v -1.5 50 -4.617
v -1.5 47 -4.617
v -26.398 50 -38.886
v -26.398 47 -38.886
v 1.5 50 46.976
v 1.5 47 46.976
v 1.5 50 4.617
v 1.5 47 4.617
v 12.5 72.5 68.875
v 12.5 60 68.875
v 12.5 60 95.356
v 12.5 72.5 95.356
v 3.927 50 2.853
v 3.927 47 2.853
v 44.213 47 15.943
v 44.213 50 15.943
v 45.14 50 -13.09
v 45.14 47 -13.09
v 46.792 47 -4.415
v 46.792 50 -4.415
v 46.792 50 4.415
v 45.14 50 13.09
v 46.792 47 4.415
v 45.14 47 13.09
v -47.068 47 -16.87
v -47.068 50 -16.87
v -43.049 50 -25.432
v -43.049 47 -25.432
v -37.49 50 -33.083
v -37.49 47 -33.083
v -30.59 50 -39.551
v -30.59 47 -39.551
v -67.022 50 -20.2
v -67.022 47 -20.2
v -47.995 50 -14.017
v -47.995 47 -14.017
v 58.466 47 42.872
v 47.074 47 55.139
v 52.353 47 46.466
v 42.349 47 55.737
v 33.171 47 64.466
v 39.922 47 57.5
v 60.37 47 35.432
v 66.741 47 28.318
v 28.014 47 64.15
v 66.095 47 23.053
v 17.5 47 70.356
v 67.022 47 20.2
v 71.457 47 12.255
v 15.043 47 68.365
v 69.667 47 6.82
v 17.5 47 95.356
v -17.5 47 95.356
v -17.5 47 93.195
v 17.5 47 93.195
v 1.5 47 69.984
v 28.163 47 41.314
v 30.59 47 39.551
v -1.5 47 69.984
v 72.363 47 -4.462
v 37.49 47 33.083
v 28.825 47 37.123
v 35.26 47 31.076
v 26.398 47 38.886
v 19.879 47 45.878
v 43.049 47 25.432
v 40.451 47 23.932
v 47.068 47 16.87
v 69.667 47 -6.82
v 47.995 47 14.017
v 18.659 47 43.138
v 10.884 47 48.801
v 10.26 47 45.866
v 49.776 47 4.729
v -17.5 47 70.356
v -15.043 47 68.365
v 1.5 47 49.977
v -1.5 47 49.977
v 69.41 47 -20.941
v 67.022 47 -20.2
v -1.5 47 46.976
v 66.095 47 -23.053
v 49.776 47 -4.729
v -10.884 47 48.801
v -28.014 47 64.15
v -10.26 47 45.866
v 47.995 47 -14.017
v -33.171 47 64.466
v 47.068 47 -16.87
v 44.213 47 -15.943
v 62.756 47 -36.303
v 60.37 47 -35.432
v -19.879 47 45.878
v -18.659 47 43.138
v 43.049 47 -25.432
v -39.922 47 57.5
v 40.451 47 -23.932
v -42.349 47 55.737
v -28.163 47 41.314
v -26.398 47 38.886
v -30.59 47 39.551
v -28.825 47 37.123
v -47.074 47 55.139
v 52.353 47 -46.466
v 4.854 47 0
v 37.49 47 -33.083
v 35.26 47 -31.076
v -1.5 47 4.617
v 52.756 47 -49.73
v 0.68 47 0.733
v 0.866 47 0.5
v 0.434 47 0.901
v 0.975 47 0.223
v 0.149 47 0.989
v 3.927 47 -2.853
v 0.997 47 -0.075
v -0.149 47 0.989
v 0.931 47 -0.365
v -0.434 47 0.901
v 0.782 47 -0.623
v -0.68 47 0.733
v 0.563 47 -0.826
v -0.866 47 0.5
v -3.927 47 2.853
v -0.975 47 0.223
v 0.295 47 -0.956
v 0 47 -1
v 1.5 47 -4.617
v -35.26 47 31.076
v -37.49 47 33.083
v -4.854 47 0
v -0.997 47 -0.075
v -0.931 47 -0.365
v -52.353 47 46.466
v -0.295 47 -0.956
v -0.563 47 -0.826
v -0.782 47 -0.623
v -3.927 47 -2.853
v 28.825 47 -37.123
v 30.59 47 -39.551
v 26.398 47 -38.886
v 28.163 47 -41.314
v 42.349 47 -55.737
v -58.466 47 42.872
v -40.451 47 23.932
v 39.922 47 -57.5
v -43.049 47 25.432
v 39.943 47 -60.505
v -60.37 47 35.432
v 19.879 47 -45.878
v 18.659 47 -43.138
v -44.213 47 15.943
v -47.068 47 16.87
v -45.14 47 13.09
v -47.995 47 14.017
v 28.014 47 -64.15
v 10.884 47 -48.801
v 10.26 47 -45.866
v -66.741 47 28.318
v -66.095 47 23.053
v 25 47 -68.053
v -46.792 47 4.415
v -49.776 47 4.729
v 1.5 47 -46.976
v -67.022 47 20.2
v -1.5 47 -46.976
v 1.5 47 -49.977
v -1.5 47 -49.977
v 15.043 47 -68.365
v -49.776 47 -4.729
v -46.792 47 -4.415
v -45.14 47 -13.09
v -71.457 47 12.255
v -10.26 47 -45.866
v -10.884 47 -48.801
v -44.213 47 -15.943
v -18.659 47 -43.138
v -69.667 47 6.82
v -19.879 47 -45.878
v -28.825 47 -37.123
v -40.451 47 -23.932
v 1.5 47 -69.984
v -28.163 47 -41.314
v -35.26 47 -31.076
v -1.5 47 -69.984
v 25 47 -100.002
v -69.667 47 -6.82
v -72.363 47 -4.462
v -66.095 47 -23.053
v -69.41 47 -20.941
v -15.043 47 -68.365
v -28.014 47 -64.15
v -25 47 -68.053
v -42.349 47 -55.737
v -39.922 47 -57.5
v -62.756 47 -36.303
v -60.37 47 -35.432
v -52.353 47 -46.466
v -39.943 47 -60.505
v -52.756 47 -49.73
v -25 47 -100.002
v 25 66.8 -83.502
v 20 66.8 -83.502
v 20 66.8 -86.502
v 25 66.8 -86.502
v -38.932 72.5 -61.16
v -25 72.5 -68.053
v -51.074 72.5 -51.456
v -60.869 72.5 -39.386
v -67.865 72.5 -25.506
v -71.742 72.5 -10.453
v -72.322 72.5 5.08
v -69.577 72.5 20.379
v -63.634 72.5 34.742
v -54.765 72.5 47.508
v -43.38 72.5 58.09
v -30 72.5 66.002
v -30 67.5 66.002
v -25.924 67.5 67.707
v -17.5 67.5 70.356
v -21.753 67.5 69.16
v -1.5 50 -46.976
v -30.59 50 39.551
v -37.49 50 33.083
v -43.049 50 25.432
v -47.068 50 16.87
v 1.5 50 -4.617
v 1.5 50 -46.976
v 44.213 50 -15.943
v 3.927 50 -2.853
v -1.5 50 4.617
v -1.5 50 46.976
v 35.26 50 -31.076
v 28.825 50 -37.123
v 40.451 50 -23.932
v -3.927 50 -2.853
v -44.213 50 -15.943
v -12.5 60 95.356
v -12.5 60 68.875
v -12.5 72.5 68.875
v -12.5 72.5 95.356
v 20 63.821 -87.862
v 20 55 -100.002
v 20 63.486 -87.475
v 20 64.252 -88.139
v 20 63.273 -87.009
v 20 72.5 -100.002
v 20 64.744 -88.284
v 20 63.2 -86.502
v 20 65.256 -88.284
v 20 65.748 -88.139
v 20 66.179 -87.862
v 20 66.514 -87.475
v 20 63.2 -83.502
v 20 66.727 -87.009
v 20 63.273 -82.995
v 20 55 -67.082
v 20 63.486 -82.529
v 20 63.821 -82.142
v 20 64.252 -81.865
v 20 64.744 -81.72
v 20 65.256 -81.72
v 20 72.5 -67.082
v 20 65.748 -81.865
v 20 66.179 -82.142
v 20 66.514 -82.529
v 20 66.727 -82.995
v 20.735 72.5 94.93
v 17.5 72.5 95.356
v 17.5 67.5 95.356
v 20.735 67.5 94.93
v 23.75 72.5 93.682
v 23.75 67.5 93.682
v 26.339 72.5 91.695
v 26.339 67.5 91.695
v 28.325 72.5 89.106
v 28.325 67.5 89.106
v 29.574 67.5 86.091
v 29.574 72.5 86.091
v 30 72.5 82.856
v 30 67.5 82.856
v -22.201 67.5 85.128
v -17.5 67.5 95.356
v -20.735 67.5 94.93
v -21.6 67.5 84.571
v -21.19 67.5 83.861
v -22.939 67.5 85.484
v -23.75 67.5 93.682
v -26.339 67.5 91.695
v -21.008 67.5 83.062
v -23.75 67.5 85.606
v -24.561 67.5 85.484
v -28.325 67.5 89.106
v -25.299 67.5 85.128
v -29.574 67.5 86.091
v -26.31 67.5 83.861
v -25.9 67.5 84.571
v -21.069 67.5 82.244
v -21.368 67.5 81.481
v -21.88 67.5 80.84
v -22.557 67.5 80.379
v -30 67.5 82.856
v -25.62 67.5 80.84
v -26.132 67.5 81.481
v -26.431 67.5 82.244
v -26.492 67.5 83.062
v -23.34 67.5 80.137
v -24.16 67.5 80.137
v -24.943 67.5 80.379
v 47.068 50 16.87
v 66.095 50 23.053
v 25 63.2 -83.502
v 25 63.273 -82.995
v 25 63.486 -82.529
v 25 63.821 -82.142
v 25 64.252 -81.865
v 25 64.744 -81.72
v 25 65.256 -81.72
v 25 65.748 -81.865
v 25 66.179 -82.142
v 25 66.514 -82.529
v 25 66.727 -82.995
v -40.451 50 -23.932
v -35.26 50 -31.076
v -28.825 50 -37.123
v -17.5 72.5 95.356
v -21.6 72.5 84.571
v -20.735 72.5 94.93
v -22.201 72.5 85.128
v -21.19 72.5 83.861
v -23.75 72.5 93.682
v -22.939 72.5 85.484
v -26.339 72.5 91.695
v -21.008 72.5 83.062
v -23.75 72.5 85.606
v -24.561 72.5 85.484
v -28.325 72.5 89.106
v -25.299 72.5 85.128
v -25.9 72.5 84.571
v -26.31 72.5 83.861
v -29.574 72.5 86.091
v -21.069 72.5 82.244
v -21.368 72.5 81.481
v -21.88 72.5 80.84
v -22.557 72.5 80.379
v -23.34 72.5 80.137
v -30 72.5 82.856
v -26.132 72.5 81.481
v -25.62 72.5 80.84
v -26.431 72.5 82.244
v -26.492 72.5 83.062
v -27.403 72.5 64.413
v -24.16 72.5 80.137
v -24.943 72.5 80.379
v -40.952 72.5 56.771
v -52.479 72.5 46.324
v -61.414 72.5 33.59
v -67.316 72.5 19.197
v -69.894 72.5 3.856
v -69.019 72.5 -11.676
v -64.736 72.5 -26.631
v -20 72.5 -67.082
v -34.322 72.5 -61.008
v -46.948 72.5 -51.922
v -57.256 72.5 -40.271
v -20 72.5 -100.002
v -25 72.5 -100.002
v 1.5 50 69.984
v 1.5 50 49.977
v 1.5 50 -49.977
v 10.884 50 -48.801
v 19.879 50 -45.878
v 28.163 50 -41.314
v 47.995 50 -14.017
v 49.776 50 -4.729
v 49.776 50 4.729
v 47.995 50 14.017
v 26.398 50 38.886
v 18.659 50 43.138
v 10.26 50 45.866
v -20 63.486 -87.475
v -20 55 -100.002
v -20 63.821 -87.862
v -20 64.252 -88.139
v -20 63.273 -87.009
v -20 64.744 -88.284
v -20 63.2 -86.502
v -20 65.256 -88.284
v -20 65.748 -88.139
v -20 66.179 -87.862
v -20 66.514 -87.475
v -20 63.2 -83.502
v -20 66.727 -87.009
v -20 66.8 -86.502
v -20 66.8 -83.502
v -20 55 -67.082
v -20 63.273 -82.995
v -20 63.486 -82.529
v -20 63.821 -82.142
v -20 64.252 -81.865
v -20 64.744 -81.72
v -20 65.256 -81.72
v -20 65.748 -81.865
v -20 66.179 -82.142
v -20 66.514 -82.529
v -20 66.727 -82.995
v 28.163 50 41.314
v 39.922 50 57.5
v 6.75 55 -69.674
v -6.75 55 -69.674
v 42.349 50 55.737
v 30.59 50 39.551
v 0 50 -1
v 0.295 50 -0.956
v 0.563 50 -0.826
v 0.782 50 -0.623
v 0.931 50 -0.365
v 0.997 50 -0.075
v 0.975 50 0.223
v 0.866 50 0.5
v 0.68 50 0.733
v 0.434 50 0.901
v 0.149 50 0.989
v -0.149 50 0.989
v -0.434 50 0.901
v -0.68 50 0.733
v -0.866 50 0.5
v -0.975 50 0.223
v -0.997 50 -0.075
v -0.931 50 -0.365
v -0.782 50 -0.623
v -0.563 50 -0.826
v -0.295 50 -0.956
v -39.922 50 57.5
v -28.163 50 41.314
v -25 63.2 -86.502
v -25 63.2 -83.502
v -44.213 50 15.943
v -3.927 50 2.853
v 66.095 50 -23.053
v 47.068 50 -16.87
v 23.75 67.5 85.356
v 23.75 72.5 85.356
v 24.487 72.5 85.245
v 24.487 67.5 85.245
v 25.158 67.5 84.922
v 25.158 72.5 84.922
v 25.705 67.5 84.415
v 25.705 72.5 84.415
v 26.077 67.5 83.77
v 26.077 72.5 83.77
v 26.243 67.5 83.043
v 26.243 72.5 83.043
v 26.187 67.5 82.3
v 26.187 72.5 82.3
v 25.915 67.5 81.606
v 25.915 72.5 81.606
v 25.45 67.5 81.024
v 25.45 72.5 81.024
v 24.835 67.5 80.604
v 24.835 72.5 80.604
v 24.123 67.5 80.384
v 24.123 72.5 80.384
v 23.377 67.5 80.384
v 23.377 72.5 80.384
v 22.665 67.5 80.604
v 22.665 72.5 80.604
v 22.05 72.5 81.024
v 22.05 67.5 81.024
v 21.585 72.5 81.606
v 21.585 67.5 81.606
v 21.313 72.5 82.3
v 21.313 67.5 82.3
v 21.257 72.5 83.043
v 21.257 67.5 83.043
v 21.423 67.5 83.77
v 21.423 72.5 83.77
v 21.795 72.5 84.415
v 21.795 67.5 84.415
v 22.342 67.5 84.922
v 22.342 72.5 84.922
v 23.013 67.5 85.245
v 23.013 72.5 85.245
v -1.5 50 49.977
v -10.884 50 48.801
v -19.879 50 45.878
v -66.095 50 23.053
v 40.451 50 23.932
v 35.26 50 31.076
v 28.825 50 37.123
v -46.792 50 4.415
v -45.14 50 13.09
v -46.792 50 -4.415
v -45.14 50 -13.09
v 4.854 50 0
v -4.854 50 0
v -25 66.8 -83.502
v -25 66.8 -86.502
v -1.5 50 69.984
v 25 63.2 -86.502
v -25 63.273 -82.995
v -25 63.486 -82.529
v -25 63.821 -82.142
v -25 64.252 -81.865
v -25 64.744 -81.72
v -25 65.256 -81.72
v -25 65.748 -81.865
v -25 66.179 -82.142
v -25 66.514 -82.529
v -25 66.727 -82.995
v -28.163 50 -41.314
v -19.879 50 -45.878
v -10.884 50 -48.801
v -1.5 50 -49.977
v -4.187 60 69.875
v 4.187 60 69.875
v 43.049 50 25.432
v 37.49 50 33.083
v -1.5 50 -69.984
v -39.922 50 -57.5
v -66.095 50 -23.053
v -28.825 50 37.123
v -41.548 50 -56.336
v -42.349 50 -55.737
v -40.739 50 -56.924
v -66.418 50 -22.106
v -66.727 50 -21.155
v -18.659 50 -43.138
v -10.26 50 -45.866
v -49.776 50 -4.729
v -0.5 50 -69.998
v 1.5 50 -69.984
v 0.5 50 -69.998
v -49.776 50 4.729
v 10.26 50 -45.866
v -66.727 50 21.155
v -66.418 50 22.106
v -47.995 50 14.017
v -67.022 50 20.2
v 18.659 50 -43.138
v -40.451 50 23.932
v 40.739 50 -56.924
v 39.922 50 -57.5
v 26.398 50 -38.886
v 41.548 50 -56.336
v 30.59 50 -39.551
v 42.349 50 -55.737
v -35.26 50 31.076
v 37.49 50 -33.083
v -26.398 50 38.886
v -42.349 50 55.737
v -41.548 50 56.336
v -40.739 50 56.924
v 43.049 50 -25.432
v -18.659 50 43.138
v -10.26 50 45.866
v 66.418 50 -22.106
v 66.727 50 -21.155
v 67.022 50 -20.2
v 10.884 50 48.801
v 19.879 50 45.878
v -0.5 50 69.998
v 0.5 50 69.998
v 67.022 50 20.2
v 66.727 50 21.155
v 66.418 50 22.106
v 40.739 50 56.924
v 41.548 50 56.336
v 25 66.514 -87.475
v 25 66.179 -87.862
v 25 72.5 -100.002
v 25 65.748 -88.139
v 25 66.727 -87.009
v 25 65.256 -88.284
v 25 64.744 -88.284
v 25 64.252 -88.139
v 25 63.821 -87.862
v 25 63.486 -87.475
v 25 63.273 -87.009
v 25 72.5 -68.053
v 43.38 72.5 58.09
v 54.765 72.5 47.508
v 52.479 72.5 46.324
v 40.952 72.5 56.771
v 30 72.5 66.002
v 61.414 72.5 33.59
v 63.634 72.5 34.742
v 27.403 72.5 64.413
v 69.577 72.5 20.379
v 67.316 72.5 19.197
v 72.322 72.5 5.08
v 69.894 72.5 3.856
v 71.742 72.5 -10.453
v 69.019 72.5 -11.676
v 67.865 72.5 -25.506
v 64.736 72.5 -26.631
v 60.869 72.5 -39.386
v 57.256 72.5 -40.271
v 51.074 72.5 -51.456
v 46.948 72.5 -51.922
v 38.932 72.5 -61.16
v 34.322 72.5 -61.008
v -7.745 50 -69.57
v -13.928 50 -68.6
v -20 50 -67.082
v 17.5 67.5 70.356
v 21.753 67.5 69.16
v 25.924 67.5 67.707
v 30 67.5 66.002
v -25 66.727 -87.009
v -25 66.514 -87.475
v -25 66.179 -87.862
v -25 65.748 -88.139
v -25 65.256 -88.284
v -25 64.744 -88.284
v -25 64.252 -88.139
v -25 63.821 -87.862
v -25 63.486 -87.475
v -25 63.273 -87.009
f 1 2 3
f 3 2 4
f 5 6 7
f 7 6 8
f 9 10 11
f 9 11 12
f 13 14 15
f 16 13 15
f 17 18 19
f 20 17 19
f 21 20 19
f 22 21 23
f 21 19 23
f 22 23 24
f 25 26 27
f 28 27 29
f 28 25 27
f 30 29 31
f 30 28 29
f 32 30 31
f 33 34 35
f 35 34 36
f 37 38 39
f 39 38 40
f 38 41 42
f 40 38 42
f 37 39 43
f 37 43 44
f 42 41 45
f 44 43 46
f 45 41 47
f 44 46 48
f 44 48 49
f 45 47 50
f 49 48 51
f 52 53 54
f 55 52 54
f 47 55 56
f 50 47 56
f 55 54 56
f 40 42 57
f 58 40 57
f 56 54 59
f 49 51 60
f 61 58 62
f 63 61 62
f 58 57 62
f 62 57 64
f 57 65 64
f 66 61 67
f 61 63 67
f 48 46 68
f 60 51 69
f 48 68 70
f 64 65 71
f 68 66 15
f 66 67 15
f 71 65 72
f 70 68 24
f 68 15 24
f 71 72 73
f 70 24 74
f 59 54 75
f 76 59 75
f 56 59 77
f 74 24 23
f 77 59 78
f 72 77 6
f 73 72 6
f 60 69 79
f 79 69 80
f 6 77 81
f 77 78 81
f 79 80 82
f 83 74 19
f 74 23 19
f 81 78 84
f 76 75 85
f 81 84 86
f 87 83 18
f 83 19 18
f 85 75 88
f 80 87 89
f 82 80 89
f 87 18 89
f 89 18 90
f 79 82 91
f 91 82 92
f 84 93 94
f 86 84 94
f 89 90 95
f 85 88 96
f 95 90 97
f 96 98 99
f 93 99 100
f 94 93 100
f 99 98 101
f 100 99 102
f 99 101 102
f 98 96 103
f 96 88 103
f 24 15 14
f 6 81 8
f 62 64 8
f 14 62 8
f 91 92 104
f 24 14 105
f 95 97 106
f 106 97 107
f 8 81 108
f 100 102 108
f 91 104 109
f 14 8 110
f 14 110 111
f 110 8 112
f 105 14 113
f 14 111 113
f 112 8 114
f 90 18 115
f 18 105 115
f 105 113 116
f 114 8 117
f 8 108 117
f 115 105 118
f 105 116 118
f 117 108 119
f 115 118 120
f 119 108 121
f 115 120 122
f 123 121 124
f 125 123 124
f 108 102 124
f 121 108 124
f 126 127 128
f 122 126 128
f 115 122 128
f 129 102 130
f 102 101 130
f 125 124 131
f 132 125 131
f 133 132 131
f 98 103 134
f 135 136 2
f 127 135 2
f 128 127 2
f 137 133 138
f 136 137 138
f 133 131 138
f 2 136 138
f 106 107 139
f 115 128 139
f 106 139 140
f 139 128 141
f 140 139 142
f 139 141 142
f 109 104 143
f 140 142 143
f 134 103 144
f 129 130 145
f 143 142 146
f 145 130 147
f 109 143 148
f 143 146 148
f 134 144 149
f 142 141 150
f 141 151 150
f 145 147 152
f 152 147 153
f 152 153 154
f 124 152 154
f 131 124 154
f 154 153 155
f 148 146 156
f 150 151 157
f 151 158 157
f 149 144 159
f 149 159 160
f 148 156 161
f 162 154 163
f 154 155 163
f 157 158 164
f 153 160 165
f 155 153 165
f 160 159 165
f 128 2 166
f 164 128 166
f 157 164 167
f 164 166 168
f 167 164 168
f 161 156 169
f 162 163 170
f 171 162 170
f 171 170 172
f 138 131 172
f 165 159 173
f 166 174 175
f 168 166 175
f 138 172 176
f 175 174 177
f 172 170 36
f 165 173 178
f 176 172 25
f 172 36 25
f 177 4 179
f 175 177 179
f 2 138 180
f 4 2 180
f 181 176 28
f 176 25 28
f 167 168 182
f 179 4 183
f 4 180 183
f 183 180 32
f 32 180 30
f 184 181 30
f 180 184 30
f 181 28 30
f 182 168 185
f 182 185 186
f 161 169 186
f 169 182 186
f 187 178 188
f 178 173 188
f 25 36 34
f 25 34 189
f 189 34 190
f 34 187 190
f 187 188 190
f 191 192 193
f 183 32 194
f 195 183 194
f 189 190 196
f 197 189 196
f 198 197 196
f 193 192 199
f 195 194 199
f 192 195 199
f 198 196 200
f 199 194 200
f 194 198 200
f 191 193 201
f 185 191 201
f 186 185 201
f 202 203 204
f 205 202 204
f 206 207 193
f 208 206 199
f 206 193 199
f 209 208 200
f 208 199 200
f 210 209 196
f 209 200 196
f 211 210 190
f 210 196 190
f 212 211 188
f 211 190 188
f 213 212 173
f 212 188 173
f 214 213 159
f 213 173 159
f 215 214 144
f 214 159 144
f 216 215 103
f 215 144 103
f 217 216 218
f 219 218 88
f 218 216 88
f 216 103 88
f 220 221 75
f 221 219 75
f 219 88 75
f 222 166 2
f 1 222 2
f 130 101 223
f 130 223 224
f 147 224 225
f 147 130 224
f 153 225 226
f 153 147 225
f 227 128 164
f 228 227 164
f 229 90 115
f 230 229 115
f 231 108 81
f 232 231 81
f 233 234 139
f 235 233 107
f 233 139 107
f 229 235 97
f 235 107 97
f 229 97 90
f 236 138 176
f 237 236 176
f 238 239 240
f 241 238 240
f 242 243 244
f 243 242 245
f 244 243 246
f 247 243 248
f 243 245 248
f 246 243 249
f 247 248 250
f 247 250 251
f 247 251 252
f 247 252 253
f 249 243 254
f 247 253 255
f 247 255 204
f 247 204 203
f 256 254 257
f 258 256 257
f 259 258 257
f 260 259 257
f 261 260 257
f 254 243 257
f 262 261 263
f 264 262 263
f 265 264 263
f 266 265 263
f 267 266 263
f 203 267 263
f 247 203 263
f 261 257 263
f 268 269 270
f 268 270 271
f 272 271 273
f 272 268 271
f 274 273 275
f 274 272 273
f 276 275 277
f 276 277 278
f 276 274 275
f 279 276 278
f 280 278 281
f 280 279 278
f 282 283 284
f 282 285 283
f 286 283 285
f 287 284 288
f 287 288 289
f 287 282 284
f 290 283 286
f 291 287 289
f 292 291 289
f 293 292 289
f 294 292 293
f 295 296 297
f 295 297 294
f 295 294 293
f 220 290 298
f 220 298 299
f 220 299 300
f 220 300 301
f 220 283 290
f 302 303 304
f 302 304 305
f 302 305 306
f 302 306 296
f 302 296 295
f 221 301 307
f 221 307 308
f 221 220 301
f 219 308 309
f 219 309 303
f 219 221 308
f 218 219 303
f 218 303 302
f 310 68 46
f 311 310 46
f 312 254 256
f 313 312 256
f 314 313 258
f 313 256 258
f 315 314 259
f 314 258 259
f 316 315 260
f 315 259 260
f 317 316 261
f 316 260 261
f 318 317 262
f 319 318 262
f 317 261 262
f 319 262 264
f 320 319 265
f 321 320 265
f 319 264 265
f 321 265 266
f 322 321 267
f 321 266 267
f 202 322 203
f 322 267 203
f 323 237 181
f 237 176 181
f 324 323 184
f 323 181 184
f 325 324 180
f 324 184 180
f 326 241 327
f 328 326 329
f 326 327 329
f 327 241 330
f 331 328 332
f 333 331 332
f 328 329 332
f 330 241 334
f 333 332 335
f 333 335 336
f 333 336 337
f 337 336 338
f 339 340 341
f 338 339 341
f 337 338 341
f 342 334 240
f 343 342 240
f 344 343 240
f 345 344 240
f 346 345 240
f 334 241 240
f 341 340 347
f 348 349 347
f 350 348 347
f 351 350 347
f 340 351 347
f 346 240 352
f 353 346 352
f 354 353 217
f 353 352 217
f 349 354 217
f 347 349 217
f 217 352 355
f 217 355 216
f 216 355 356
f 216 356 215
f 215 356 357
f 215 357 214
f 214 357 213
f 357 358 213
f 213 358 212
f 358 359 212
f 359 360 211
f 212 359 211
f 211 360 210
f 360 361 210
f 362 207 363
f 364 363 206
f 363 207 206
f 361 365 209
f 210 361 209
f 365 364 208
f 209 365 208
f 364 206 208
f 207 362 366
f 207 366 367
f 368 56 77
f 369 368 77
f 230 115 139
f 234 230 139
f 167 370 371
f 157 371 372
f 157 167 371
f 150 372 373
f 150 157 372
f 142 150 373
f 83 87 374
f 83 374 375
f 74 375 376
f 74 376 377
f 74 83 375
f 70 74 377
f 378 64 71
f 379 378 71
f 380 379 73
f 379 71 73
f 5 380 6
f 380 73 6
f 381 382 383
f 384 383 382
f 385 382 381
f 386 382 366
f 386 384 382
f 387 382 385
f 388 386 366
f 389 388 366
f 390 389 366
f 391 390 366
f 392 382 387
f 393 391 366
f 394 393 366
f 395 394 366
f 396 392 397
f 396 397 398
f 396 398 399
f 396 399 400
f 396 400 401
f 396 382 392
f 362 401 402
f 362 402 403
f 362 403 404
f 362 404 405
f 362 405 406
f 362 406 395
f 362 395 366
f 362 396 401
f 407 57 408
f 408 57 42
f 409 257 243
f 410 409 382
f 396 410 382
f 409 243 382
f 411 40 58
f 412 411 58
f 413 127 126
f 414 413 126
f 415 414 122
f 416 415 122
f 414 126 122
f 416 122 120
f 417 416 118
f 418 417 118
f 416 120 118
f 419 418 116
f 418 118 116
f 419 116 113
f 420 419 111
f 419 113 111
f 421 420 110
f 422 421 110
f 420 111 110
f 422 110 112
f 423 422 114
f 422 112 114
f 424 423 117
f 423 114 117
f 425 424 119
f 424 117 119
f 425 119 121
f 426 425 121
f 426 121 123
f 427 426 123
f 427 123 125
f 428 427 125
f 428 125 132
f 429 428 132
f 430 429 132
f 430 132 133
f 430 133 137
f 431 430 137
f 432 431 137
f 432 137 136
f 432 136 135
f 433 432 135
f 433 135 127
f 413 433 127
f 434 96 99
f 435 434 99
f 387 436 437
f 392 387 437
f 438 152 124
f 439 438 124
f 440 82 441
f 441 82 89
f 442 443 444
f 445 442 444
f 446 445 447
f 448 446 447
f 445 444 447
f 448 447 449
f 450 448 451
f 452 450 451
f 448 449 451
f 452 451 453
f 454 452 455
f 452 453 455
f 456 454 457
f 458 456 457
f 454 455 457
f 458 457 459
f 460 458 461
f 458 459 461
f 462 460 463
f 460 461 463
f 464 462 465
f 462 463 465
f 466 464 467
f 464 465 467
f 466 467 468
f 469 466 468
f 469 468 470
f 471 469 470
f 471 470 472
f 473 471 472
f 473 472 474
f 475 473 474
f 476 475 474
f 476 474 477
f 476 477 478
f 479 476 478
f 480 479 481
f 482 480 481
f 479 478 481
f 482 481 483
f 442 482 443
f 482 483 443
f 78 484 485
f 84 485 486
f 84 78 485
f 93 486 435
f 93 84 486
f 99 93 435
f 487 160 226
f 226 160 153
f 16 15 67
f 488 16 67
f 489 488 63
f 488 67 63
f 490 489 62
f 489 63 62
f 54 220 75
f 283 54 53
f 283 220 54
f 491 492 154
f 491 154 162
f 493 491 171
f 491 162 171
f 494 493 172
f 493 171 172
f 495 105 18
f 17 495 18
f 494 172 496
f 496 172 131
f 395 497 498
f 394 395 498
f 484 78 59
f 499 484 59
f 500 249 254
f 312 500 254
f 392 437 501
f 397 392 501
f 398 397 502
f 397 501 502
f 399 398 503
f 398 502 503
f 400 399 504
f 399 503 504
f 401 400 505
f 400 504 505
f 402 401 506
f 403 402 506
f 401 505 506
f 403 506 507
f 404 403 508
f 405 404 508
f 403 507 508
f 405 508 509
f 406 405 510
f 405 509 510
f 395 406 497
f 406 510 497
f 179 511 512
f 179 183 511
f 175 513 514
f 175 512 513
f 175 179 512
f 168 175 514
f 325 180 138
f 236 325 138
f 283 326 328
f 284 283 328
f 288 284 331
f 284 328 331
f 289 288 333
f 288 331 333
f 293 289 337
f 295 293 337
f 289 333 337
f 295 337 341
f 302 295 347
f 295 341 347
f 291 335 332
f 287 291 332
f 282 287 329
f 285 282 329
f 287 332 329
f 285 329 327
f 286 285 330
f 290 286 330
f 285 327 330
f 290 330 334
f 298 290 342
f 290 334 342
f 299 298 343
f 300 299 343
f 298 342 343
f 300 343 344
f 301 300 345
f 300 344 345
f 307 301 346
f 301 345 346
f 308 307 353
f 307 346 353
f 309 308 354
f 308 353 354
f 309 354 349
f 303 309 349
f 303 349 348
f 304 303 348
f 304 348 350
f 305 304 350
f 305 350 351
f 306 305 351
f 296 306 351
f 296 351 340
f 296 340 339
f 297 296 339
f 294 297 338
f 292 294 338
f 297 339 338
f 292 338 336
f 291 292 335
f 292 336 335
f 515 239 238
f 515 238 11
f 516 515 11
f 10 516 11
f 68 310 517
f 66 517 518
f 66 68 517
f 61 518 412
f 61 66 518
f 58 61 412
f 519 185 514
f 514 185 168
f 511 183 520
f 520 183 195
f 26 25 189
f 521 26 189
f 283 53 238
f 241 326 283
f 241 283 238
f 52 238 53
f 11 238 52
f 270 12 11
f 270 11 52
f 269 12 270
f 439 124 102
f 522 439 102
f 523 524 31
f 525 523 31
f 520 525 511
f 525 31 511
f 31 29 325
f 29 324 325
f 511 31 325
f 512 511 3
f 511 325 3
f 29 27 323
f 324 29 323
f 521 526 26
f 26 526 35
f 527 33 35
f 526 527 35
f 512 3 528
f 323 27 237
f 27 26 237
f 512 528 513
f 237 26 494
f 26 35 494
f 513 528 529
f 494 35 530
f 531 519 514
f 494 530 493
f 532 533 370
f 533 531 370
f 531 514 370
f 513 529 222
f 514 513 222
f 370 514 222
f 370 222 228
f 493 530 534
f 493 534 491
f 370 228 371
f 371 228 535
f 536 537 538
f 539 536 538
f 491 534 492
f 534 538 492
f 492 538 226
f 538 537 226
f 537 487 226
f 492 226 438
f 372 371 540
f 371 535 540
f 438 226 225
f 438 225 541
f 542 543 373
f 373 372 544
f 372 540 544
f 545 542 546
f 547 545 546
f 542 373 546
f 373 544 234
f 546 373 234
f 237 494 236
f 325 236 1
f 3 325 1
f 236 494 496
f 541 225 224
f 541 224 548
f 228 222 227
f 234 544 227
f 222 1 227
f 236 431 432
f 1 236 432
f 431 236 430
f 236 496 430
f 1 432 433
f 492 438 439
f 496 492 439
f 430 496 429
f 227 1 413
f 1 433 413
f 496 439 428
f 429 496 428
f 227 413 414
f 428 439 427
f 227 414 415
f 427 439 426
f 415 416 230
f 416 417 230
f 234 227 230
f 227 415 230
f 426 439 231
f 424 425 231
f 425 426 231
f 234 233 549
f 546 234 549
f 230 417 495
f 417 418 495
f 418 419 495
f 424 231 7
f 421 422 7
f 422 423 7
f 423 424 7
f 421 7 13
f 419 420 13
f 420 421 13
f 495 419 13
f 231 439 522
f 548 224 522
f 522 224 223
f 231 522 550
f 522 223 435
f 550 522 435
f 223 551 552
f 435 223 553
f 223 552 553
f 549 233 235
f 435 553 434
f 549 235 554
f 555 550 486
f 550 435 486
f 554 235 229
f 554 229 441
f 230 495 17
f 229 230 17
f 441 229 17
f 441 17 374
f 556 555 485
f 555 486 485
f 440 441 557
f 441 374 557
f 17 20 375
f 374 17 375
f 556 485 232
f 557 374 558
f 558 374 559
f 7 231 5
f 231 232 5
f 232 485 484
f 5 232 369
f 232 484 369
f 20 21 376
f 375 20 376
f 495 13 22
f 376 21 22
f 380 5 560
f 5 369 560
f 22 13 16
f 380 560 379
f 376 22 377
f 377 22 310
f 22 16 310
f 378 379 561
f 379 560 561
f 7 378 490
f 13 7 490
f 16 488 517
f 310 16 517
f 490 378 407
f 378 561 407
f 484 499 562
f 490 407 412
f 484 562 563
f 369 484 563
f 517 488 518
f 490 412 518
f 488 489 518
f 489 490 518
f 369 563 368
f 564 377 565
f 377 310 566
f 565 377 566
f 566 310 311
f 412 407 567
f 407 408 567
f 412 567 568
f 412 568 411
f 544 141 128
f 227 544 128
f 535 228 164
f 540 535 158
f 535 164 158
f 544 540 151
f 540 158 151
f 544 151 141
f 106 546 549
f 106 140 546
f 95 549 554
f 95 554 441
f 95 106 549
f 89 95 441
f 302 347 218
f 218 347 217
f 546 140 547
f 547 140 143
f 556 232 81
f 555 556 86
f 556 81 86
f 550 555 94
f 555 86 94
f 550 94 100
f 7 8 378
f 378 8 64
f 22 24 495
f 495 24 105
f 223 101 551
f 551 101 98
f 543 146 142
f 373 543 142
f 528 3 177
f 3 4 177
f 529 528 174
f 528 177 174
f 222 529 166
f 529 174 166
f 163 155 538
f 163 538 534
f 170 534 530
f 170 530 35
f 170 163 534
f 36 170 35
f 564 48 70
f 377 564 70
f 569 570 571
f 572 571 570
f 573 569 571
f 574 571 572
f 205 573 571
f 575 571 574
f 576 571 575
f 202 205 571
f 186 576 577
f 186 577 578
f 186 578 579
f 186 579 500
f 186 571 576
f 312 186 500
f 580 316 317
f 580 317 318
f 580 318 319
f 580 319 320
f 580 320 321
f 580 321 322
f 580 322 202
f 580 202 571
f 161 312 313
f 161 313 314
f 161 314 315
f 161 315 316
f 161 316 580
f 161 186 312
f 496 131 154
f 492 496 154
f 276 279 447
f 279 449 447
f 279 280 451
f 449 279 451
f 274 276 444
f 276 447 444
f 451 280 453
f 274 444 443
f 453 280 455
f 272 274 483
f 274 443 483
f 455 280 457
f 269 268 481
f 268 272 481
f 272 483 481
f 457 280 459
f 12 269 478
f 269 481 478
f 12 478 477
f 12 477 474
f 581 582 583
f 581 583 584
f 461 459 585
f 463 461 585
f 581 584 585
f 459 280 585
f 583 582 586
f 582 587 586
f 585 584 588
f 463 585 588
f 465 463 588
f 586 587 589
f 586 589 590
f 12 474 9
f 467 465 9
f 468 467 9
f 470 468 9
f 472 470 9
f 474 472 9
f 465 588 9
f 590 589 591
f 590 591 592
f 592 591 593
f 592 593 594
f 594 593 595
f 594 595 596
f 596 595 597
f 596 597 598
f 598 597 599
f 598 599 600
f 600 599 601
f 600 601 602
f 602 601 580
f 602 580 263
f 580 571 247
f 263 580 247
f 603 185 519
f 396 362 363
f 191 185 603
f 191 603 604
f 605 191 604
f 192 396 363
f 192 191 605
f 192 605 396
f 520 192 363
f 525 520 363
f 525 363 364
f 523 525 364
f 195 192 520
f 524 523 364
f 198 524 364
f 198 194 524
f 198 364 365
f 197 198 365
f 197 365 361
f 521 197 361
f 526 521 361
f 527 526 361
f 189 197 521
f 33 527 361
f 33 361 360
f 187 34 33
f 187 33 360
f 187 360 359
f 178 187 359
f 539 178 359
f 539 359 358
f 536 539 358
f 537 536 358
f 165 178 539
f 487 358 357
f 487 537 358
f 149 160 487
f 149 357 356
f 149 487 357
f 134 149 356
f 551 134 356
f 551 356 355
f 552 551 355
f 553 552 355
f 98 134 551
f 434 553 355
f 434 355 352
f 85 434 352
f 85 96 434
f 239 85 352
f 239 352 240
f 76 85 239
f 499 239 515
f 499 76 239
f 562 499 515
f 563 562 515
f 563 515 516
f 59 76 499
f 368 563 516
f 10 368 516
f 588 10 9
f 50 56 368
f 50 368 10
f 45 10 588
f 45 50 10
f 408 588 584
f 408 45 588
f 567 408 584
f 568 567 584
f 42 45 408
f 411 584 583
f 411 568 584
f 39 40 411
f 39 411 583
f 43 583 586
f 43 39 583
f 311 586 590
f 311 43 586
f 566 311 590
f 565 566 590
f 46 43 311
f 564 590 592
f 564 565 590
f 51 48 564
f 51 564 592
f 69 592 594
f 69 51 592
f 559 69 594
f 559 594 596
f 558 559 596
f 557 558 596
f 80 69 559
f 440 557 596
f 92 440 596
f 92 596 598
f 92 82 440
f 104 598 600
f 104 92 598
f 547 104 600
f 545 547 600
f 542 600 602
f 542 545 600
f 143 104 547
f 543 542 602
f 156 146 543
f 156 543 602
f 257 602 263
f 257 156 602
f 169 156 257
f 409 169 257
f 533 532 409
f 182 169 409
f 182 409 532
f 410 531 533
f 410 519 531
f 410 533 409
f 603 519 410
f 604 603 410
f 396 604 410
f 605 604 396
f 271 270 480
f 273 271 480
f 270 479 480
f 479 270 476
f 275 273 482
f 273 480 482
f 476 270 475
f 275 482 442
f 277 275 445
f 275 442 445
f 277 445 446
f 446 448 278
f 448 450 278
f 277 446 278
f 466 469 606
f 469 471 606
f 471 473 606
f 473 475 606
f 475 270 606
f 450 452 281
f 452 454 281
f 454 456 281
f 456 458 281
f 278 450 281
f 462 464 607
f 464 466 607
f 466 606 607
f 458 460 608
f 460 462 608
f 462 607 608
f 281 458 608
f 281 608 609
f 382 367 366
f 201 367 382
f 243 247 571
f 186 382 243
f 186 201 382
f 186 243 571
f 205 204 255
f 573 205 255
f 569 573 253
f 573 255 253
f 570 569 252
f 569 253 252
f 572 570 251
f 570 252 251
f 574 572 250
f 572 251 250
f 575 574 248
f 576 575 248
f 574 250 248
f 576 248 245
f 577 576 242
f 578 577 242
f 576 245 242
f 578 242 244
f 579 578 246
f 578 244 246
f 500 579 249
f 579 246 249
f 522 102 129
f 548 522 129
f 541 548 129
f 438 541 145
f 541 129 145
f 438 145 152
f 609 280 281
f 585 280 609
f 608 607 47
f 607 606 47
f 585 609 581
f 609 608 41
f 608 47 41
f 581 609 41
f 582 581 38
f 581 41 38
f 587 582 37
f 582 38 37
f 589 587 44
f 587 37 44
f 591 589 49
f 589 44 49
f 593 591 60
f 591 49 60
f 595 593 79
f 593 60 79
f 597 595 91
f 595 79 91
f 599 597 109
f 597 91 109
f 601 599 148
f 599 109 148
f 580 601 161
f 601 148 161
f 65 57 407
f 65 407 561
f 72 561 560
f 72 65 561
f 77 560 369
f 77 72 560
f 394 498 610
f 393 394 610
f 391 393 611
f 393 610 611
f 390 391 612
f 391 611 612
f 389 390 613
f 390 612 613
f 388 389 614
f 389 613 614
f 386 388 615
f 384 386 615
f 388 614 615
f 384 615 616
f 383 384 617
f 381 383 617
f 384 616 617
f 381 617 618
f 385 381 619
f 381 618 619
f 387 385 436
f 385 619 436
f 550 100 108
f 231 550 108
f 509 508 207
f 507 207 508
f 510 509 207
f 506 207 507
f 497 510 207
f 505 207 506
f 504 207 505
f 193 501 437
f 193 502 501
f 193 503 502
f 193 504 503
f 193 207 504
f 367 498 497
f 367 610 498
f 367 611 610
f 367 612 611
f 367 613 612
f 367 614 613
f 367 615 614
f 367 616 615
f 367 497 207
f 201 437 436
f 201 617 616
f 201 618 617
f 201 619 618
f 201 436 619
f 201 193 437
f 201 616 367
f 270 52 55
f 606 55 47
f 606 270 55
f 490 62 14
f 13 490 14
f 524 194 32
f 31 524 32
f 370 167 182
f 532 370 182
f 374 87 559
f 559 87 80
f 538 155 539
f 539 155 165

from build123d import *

# Parameters (mm, degrees)
SKETCH1_R               = 72.5
SKETCH1_R_2             = 70
BOSS_EXTRUDE4_DEPTH     = 16
BOSS_EXTRUDE5_DEPTH     = 50
SKETCH2_R               = 1
CUT_EXTRUDE1_DEPTH      = 115.072345465
SKETCH3_R               = 50
SKETCH3_R_2             = 47
BOSS_EXTRUDE6_DEPTH     = 50
SKETCH1_12_R            = 72.5
SKETCH1_12_R_2          = 70
BOSS_EXTRUDE7_DEPTH     = 72.5
BOSS_EXTRUDE8_DEPTH     = 26
SKETCH5_W               = 25
SKETCH5_H               = 25
CUT_EXTRUDE4_DEPTH      = 137.5
SKETCH7_R               = 2.75
SKETCH7_R_2             = 2.5
BOSS_EXTRUDE9_DEPTH     = 5
SKETCH12_W              = 40
SKETCH12_H              = 45
CUT_EXTRUDE5_DEPTH      = 180
BOSS_EXTRUDE11_START    = -49.596857296
BOSS_EXTRUDE11_DEPTH    = 49.596857296
SKETCH12_2_W            = 40
SKETCH12_2_H            = 45
CUT_EXTRUDE6_DEPTH      = 199.5
CUT_EXTRUDE7_DEPTH      = 136.410776564
CUT_EXTRUDE7_DEPTH_BACK = 136.410776564
SKETCH17_W              = 54.58952291
SKETCH17_H              = 5.845779458
CUT_EXTRUDE8_DEPTH      = 158.362345779
CUT_EXTRUDE8_DEPTH_BACK = 158.362345779
SKETCH22_W              = 10
SKETCH22_H              = 10
BOSS_EXTRUDE12_DEPTH    = 22.903142704
CUT_EXTRUDE9_DEPTH      = 144.988394911
CUT_EXTRUDE9_DEPTH_BACK = 144.988394911
SKETCH24_W              = 215.86755616
SKETCH24_H              = 61.868005926
BOSS_EXTRUDE13_DEPTH    = 5
SKETCH27_W              = 40.372489194
SKETCH27_H              = 5.878977483
CUT_EXTRUDE11_DEPTH     = 5


with BuildPart() as part:
    # Sketch1 → Boss-Extrude4 (new body)
    with BuildSketch(Plane(origin=(0, 0, 0), x_dir=(1, 0, 0), z_dir=(0, 1, 0))):
        with Locations(Location((0, 0, 0), (0, 0, 270))):
            Circle(SKETCH1_R)
        with Locations(Location((0, 0, 0), (0, 0, 270))):
            Circle(SKETCH1_R_2, mode=Mode.SUBTRACT)
    extrude(amount=BOSS_EXTRUDE4_DEPTH)

    # Sketch1<11> → Boss-Extrude5 (add)
    with BuildSketch(Plane(origin=(0, 0, 0), x_dir=(1, 0, 0), z_dir=(0, 1, 0))):
        Polygon((1.5, 69.983926726), (0, 70.992443901), (-1.5, 69.983926726), (-1.5, 4.616525306), (-39.921994536, 57.499863933), (-41.728311549, 57.434093588), (-42.349045519, 55.736508176), (-3.927050983, 2.853169549), (-66.095144057, 23.052807466), (-67.51782638, 21.937871638), (-67.02219504, 20.199637917), (-4.854101966, 0), (-67.02219504, -20.199637917), (-67.51782638, -21.937871638), (-66.095144057, -23.052807466), (-3.927050983, -2.853169549), (-42.349045519, -55.736508176), (-41.728311549, -57.434093588), (-39.921994536, -57.499863933), (-1.5, -4.616525306), (-1.5, -69.983926726), (0, -70.992443901), (1.5, -69.983926726), (1.5, -4.616525306), (39.921994536, -57.499863933), (41.728311549, -57.434093588), (42.349045519, -55.736508176), (3.927050983, -2.853169549), (66.095144057, -23.052807466), (67.51782638, -21.937871638), (67.02219504, -20.199637917), (4.854101966, 0), (67.02219504, 20.199637917), (67.51782638, 21.937871638), (66.095144057, 23.052807466), (3.927050983, 2.853169549), (42.349045519, 55.736508176), (41.728311549, 57.434093588), (39.921994536, 57.499863933), (1.5, 4.616525306), align=None)
    extrude(amount=BOSS_EXTRUDE5_DEPTH)

    # Sketch2 → Cut-Extrude1 (cut, through all)
    with BuildSketch(Plane.XZ):
        with Locations(Location((0, 0, 0), (0, 0, 270))):
            Circle(SKETCH2_R)
    extrude(amount=-CUT_EXTRUDE1_DEPTH, mode=Mode.SUBTRACT)

    # Sketch3 → Boss-Extrude6 (add)
    with BuildSketch(Plane.XZ):
        Circle(SKETCH3_R)
        Circle(SKETCH3_R_2, mode=Mode.SUBTRACT)
    extrude(amount=-BOSS_EXTRUDE6_DEPTH)

    # Sketch1<12> → Boss-Extrude7 (add)
    with BuildSketch(Plane(origin=(0, 0, 0), x_dir=(1, 0, 0), z_dir=(0, 1, 0))):
        with Locations(Location((0, 0, 0), (0, 0, 270))):
            Circle(SKETCH1_12_R)
        with Locations(Location((0, 0, 0), (0, 0, 91.227860685))):
            Circle(SKETCH1_12_R_2, mode=Mode.SUBTRACT)
    extrude(amount=BOSS_EXTRUDE7_DEPTH)

    # Sketch6 → Boss-Extrude8 (add)
    with BuildSketch(Plane(origin=(0, 72.5, 0), x_dir=(1, 0, 0), z_dir=(0, 1, 0))):
        Polygon((-12.5, -95.356236397), (12.5, -95.356236397), (17.5, -95.356236397), (17.5, -70.356236397), (12.5, -70.356236397), (-12.5, -70.356236397), (-17.5, -70.356236397), (-17.5, -95.356236397), align=None)
    extrude(amount=-BOSS_EXTRUDE8_DEPTH)

    # Sketch5 → Cut-Extrude4 (cut)
    with BuildSketch(Plane.XY):
        with Locations((0, 72.5)):
            Rectangle(SKETCH5_W, SKETCH5_H)
    extrude(amount=CUT_EXTRUDE4_DEPTH, mode=Mode.SUBTRACT)

    # Sketch7 → Boss-Extrude9 (add)
    # profile 1 of 2: a face of its own
    with BuildSketch(Plane(origin=(0, 72.5, 0), x_dir=(1, 0, 0), z_dir=(0, 1, 0))):
        with BuildLine():
            Line((-30, -82.856236397), (-30, -66.001893912))
            Line((-30, -66.001893912), (-17.5, -70.356236397))
            Line((-17.5, -70.356236397), (-17.5, -95.356236397))
            ThreePointArc((-17.5, -95.356236397), (-26.338834765, -91.695071162), (-30, -82.856236397))
        make_face()
        with Locations(Location((-23.75, -82.856236397, 0), (0, 0, 270))):
            Circle(SKETCH7_R, mode=Mode.SUBTRACT)
    # profile 2 of 2: a face of its own
    with BuildSketch(Plane(origin=(0, 72.5, 0), x_dir=(1, 0, 0), z_dir=(0, 1, 0))):
        with BuildLine():
            Line((30, -82.856236397), (30, -66.001893912))
            Line((30, -66.001893912), (17.5, -70.356236397))
            Line((17.5, -70.356236397), (17.5, -95.356236397))
            ThreePointArc((17.5, -95.356236397), (26.338834765, -91.695071162), (30, -82.856236397))
        make_face()
        with Locations(Location((23.75, -82.856236397, 0), (0, 0, 270))):
            Circle(SKETCH7_R_2, mode=Mode.SUBTRACT)
    extrude(amount=-BOSS_EXTRUDE9_DEPTH)

    # Sketch12 → Cut-Extrude5 (cut)
    with BuildSketch(Plane.XY):
        with Locations((0, 72.5)):
            Rectangle(SKETCH12_W, SKETCH12_H)
    extrude(amount=-CUT_EXTRUDE5_DEPTH, mode=Mode.SUBTRACT)

    # Sketch15 → Boss-Extrude11 (add)
    with BuildSketch(Plane(origin=(0, 72.5, 0), x_dir=(1, 0, 0), z_dir=(0, 1, 0)).offset(BOSS_EXTRUDE11_START)):
        with BuildLine():
            Line((-25, 103.053287944), (25, 103.053287944))
            Line((25, 103.053287944), (25, 68.053287944))
            ThreePointArc((25, 68.053287944), (0, 72.5), (-25, 68.053287944))
            Line((-25, 68.053287944), (-25, 103.053287944))
        make_face()
    extrude(amount=BOSS_EXTRUDE11_DEPTH)

    # Sketch12<2> → Cut-Extrude6 (cut)
    with BuildSketch(Plane.XY):
        with Locations((0, 72.5)):
            Rectangle(SKETCH12_2_W, SKETCH12_2_H)
    extrude(amount=-CUT_EXTRUDE6_DEPTH, mode=Mode.SUBTRACT)

    # Sketch17 → Cut-Extrude7 (cut, two sides: drawn at the far end of the back side and taken through both)
    with BuildSketch(Plane.XZ.offset(-22.903142704).offset(-CUT_EXTRUDE7_DEPTH_BACK)):
        with Locations((-0.620011984, -102.924929054)):
            Rectangle(SKETCH17_W, SKETCH17_H)
    extrude(amount=CUT_EXTRUDE7_DEPTH + CUT_EXTRUDE7_DEPTH_BACK, mode=Mode.SUBTRACT)

    # Sketch20 → Cut-Extrude8 (cut, two sides: drawn at the far end of the back side and taken through both)
    with BuildSketch(Plane(origin=(25, 0, 0), x_dir=(0, 0, -1), z_dir=(1, 0, 0)).offset(-CUT_EXTRUDE8_DEPTH_BACK)):
        with BuildLine():
            Line((83.502039325, 66.8), (86.502039325, 66.8))
            ThreePointArc((86.502039325, 66.8), (88.302039325, 65), (86.502039325, 63.2))
            Line((86.502039325, 63.2), (83.502039325, 63.2))
            ThreePointArc((83.502039325, 63.2), (81.702039325, 65), (83.502039325, 66.8))
        make_face()
    extrude(amount=CUT_EXTRUDE8_DEPTH + CUT_EXTRUDE8_DEPTH_BACK, mode=Mode.SUBTRACT)

    # Sketch22 → Boss-Extrude12 (add)
    with BuildSketch(Plane.XZ.offset(-22.903142704)):
        with Locations((0, -77.327380707)):
            Rectangle(SKETCH22_W, SKETCH22_H)
    extrude(amount=BOSS_EXTRUDE12_DEPTH)

    # Sketch24 → Cut-Extrude9 (cut, two sides: drawn at the far end of the back side and taken through both)
    with BuildSketch(Plane(origin=(1.5, 0, 0), x_dir=(0, 0, -1), z_dir=(1, 0, 0)).offset(-CUT_EXTRUDE9_DEPTH_BACK)):
        with Locations((14.738289666, 16.065997037)):
            Rectangle(SKETCH24_W, SKETCH24_H)
    extrude(amount=CUT_EXTRUDE9_DEPTH + CUT_EXTRUDE9_DEPTH_BACK, mode=Mode.SUBTRACT)

    # Sketch25 → Boss-Extrude13 (add)
    with BuildSketch(Plane(origin=(0, 50, 0), x_dir=(1, 0, 0), z_dir=(0, 1, 0))):
        with BuildLine():
            Line((-20, 67.082039325), (-20, 100.002039325))
            Line((-20, 100.002039325), (20, 100.002039325))
            Line((20, 100.002039325), (20, 67.082039325))
            ThreePointArc((20, 67.082039325), (0, 70), (-20, 67.082039325))
        make_face()
    extrude(amount=BOSS_EXTRUDE13_DEPTH)

    # Sketch27 → Cut-Extrude11 (cut)
    with BuildSketch(Plane(origin=(0, 0, 93.195488414), x_dir=(-1, 0, 0), z_dir=(0, 0, -1))):
        with Locations((1.632930754, 44.060511259)):
            Rectangle(SKETCH27_W, SKETCH27_H)
    extrude(amount=-CUT_EXTRUDE11_DEPTH, mode=Mode.SUBTRACT)


solid = part.part
